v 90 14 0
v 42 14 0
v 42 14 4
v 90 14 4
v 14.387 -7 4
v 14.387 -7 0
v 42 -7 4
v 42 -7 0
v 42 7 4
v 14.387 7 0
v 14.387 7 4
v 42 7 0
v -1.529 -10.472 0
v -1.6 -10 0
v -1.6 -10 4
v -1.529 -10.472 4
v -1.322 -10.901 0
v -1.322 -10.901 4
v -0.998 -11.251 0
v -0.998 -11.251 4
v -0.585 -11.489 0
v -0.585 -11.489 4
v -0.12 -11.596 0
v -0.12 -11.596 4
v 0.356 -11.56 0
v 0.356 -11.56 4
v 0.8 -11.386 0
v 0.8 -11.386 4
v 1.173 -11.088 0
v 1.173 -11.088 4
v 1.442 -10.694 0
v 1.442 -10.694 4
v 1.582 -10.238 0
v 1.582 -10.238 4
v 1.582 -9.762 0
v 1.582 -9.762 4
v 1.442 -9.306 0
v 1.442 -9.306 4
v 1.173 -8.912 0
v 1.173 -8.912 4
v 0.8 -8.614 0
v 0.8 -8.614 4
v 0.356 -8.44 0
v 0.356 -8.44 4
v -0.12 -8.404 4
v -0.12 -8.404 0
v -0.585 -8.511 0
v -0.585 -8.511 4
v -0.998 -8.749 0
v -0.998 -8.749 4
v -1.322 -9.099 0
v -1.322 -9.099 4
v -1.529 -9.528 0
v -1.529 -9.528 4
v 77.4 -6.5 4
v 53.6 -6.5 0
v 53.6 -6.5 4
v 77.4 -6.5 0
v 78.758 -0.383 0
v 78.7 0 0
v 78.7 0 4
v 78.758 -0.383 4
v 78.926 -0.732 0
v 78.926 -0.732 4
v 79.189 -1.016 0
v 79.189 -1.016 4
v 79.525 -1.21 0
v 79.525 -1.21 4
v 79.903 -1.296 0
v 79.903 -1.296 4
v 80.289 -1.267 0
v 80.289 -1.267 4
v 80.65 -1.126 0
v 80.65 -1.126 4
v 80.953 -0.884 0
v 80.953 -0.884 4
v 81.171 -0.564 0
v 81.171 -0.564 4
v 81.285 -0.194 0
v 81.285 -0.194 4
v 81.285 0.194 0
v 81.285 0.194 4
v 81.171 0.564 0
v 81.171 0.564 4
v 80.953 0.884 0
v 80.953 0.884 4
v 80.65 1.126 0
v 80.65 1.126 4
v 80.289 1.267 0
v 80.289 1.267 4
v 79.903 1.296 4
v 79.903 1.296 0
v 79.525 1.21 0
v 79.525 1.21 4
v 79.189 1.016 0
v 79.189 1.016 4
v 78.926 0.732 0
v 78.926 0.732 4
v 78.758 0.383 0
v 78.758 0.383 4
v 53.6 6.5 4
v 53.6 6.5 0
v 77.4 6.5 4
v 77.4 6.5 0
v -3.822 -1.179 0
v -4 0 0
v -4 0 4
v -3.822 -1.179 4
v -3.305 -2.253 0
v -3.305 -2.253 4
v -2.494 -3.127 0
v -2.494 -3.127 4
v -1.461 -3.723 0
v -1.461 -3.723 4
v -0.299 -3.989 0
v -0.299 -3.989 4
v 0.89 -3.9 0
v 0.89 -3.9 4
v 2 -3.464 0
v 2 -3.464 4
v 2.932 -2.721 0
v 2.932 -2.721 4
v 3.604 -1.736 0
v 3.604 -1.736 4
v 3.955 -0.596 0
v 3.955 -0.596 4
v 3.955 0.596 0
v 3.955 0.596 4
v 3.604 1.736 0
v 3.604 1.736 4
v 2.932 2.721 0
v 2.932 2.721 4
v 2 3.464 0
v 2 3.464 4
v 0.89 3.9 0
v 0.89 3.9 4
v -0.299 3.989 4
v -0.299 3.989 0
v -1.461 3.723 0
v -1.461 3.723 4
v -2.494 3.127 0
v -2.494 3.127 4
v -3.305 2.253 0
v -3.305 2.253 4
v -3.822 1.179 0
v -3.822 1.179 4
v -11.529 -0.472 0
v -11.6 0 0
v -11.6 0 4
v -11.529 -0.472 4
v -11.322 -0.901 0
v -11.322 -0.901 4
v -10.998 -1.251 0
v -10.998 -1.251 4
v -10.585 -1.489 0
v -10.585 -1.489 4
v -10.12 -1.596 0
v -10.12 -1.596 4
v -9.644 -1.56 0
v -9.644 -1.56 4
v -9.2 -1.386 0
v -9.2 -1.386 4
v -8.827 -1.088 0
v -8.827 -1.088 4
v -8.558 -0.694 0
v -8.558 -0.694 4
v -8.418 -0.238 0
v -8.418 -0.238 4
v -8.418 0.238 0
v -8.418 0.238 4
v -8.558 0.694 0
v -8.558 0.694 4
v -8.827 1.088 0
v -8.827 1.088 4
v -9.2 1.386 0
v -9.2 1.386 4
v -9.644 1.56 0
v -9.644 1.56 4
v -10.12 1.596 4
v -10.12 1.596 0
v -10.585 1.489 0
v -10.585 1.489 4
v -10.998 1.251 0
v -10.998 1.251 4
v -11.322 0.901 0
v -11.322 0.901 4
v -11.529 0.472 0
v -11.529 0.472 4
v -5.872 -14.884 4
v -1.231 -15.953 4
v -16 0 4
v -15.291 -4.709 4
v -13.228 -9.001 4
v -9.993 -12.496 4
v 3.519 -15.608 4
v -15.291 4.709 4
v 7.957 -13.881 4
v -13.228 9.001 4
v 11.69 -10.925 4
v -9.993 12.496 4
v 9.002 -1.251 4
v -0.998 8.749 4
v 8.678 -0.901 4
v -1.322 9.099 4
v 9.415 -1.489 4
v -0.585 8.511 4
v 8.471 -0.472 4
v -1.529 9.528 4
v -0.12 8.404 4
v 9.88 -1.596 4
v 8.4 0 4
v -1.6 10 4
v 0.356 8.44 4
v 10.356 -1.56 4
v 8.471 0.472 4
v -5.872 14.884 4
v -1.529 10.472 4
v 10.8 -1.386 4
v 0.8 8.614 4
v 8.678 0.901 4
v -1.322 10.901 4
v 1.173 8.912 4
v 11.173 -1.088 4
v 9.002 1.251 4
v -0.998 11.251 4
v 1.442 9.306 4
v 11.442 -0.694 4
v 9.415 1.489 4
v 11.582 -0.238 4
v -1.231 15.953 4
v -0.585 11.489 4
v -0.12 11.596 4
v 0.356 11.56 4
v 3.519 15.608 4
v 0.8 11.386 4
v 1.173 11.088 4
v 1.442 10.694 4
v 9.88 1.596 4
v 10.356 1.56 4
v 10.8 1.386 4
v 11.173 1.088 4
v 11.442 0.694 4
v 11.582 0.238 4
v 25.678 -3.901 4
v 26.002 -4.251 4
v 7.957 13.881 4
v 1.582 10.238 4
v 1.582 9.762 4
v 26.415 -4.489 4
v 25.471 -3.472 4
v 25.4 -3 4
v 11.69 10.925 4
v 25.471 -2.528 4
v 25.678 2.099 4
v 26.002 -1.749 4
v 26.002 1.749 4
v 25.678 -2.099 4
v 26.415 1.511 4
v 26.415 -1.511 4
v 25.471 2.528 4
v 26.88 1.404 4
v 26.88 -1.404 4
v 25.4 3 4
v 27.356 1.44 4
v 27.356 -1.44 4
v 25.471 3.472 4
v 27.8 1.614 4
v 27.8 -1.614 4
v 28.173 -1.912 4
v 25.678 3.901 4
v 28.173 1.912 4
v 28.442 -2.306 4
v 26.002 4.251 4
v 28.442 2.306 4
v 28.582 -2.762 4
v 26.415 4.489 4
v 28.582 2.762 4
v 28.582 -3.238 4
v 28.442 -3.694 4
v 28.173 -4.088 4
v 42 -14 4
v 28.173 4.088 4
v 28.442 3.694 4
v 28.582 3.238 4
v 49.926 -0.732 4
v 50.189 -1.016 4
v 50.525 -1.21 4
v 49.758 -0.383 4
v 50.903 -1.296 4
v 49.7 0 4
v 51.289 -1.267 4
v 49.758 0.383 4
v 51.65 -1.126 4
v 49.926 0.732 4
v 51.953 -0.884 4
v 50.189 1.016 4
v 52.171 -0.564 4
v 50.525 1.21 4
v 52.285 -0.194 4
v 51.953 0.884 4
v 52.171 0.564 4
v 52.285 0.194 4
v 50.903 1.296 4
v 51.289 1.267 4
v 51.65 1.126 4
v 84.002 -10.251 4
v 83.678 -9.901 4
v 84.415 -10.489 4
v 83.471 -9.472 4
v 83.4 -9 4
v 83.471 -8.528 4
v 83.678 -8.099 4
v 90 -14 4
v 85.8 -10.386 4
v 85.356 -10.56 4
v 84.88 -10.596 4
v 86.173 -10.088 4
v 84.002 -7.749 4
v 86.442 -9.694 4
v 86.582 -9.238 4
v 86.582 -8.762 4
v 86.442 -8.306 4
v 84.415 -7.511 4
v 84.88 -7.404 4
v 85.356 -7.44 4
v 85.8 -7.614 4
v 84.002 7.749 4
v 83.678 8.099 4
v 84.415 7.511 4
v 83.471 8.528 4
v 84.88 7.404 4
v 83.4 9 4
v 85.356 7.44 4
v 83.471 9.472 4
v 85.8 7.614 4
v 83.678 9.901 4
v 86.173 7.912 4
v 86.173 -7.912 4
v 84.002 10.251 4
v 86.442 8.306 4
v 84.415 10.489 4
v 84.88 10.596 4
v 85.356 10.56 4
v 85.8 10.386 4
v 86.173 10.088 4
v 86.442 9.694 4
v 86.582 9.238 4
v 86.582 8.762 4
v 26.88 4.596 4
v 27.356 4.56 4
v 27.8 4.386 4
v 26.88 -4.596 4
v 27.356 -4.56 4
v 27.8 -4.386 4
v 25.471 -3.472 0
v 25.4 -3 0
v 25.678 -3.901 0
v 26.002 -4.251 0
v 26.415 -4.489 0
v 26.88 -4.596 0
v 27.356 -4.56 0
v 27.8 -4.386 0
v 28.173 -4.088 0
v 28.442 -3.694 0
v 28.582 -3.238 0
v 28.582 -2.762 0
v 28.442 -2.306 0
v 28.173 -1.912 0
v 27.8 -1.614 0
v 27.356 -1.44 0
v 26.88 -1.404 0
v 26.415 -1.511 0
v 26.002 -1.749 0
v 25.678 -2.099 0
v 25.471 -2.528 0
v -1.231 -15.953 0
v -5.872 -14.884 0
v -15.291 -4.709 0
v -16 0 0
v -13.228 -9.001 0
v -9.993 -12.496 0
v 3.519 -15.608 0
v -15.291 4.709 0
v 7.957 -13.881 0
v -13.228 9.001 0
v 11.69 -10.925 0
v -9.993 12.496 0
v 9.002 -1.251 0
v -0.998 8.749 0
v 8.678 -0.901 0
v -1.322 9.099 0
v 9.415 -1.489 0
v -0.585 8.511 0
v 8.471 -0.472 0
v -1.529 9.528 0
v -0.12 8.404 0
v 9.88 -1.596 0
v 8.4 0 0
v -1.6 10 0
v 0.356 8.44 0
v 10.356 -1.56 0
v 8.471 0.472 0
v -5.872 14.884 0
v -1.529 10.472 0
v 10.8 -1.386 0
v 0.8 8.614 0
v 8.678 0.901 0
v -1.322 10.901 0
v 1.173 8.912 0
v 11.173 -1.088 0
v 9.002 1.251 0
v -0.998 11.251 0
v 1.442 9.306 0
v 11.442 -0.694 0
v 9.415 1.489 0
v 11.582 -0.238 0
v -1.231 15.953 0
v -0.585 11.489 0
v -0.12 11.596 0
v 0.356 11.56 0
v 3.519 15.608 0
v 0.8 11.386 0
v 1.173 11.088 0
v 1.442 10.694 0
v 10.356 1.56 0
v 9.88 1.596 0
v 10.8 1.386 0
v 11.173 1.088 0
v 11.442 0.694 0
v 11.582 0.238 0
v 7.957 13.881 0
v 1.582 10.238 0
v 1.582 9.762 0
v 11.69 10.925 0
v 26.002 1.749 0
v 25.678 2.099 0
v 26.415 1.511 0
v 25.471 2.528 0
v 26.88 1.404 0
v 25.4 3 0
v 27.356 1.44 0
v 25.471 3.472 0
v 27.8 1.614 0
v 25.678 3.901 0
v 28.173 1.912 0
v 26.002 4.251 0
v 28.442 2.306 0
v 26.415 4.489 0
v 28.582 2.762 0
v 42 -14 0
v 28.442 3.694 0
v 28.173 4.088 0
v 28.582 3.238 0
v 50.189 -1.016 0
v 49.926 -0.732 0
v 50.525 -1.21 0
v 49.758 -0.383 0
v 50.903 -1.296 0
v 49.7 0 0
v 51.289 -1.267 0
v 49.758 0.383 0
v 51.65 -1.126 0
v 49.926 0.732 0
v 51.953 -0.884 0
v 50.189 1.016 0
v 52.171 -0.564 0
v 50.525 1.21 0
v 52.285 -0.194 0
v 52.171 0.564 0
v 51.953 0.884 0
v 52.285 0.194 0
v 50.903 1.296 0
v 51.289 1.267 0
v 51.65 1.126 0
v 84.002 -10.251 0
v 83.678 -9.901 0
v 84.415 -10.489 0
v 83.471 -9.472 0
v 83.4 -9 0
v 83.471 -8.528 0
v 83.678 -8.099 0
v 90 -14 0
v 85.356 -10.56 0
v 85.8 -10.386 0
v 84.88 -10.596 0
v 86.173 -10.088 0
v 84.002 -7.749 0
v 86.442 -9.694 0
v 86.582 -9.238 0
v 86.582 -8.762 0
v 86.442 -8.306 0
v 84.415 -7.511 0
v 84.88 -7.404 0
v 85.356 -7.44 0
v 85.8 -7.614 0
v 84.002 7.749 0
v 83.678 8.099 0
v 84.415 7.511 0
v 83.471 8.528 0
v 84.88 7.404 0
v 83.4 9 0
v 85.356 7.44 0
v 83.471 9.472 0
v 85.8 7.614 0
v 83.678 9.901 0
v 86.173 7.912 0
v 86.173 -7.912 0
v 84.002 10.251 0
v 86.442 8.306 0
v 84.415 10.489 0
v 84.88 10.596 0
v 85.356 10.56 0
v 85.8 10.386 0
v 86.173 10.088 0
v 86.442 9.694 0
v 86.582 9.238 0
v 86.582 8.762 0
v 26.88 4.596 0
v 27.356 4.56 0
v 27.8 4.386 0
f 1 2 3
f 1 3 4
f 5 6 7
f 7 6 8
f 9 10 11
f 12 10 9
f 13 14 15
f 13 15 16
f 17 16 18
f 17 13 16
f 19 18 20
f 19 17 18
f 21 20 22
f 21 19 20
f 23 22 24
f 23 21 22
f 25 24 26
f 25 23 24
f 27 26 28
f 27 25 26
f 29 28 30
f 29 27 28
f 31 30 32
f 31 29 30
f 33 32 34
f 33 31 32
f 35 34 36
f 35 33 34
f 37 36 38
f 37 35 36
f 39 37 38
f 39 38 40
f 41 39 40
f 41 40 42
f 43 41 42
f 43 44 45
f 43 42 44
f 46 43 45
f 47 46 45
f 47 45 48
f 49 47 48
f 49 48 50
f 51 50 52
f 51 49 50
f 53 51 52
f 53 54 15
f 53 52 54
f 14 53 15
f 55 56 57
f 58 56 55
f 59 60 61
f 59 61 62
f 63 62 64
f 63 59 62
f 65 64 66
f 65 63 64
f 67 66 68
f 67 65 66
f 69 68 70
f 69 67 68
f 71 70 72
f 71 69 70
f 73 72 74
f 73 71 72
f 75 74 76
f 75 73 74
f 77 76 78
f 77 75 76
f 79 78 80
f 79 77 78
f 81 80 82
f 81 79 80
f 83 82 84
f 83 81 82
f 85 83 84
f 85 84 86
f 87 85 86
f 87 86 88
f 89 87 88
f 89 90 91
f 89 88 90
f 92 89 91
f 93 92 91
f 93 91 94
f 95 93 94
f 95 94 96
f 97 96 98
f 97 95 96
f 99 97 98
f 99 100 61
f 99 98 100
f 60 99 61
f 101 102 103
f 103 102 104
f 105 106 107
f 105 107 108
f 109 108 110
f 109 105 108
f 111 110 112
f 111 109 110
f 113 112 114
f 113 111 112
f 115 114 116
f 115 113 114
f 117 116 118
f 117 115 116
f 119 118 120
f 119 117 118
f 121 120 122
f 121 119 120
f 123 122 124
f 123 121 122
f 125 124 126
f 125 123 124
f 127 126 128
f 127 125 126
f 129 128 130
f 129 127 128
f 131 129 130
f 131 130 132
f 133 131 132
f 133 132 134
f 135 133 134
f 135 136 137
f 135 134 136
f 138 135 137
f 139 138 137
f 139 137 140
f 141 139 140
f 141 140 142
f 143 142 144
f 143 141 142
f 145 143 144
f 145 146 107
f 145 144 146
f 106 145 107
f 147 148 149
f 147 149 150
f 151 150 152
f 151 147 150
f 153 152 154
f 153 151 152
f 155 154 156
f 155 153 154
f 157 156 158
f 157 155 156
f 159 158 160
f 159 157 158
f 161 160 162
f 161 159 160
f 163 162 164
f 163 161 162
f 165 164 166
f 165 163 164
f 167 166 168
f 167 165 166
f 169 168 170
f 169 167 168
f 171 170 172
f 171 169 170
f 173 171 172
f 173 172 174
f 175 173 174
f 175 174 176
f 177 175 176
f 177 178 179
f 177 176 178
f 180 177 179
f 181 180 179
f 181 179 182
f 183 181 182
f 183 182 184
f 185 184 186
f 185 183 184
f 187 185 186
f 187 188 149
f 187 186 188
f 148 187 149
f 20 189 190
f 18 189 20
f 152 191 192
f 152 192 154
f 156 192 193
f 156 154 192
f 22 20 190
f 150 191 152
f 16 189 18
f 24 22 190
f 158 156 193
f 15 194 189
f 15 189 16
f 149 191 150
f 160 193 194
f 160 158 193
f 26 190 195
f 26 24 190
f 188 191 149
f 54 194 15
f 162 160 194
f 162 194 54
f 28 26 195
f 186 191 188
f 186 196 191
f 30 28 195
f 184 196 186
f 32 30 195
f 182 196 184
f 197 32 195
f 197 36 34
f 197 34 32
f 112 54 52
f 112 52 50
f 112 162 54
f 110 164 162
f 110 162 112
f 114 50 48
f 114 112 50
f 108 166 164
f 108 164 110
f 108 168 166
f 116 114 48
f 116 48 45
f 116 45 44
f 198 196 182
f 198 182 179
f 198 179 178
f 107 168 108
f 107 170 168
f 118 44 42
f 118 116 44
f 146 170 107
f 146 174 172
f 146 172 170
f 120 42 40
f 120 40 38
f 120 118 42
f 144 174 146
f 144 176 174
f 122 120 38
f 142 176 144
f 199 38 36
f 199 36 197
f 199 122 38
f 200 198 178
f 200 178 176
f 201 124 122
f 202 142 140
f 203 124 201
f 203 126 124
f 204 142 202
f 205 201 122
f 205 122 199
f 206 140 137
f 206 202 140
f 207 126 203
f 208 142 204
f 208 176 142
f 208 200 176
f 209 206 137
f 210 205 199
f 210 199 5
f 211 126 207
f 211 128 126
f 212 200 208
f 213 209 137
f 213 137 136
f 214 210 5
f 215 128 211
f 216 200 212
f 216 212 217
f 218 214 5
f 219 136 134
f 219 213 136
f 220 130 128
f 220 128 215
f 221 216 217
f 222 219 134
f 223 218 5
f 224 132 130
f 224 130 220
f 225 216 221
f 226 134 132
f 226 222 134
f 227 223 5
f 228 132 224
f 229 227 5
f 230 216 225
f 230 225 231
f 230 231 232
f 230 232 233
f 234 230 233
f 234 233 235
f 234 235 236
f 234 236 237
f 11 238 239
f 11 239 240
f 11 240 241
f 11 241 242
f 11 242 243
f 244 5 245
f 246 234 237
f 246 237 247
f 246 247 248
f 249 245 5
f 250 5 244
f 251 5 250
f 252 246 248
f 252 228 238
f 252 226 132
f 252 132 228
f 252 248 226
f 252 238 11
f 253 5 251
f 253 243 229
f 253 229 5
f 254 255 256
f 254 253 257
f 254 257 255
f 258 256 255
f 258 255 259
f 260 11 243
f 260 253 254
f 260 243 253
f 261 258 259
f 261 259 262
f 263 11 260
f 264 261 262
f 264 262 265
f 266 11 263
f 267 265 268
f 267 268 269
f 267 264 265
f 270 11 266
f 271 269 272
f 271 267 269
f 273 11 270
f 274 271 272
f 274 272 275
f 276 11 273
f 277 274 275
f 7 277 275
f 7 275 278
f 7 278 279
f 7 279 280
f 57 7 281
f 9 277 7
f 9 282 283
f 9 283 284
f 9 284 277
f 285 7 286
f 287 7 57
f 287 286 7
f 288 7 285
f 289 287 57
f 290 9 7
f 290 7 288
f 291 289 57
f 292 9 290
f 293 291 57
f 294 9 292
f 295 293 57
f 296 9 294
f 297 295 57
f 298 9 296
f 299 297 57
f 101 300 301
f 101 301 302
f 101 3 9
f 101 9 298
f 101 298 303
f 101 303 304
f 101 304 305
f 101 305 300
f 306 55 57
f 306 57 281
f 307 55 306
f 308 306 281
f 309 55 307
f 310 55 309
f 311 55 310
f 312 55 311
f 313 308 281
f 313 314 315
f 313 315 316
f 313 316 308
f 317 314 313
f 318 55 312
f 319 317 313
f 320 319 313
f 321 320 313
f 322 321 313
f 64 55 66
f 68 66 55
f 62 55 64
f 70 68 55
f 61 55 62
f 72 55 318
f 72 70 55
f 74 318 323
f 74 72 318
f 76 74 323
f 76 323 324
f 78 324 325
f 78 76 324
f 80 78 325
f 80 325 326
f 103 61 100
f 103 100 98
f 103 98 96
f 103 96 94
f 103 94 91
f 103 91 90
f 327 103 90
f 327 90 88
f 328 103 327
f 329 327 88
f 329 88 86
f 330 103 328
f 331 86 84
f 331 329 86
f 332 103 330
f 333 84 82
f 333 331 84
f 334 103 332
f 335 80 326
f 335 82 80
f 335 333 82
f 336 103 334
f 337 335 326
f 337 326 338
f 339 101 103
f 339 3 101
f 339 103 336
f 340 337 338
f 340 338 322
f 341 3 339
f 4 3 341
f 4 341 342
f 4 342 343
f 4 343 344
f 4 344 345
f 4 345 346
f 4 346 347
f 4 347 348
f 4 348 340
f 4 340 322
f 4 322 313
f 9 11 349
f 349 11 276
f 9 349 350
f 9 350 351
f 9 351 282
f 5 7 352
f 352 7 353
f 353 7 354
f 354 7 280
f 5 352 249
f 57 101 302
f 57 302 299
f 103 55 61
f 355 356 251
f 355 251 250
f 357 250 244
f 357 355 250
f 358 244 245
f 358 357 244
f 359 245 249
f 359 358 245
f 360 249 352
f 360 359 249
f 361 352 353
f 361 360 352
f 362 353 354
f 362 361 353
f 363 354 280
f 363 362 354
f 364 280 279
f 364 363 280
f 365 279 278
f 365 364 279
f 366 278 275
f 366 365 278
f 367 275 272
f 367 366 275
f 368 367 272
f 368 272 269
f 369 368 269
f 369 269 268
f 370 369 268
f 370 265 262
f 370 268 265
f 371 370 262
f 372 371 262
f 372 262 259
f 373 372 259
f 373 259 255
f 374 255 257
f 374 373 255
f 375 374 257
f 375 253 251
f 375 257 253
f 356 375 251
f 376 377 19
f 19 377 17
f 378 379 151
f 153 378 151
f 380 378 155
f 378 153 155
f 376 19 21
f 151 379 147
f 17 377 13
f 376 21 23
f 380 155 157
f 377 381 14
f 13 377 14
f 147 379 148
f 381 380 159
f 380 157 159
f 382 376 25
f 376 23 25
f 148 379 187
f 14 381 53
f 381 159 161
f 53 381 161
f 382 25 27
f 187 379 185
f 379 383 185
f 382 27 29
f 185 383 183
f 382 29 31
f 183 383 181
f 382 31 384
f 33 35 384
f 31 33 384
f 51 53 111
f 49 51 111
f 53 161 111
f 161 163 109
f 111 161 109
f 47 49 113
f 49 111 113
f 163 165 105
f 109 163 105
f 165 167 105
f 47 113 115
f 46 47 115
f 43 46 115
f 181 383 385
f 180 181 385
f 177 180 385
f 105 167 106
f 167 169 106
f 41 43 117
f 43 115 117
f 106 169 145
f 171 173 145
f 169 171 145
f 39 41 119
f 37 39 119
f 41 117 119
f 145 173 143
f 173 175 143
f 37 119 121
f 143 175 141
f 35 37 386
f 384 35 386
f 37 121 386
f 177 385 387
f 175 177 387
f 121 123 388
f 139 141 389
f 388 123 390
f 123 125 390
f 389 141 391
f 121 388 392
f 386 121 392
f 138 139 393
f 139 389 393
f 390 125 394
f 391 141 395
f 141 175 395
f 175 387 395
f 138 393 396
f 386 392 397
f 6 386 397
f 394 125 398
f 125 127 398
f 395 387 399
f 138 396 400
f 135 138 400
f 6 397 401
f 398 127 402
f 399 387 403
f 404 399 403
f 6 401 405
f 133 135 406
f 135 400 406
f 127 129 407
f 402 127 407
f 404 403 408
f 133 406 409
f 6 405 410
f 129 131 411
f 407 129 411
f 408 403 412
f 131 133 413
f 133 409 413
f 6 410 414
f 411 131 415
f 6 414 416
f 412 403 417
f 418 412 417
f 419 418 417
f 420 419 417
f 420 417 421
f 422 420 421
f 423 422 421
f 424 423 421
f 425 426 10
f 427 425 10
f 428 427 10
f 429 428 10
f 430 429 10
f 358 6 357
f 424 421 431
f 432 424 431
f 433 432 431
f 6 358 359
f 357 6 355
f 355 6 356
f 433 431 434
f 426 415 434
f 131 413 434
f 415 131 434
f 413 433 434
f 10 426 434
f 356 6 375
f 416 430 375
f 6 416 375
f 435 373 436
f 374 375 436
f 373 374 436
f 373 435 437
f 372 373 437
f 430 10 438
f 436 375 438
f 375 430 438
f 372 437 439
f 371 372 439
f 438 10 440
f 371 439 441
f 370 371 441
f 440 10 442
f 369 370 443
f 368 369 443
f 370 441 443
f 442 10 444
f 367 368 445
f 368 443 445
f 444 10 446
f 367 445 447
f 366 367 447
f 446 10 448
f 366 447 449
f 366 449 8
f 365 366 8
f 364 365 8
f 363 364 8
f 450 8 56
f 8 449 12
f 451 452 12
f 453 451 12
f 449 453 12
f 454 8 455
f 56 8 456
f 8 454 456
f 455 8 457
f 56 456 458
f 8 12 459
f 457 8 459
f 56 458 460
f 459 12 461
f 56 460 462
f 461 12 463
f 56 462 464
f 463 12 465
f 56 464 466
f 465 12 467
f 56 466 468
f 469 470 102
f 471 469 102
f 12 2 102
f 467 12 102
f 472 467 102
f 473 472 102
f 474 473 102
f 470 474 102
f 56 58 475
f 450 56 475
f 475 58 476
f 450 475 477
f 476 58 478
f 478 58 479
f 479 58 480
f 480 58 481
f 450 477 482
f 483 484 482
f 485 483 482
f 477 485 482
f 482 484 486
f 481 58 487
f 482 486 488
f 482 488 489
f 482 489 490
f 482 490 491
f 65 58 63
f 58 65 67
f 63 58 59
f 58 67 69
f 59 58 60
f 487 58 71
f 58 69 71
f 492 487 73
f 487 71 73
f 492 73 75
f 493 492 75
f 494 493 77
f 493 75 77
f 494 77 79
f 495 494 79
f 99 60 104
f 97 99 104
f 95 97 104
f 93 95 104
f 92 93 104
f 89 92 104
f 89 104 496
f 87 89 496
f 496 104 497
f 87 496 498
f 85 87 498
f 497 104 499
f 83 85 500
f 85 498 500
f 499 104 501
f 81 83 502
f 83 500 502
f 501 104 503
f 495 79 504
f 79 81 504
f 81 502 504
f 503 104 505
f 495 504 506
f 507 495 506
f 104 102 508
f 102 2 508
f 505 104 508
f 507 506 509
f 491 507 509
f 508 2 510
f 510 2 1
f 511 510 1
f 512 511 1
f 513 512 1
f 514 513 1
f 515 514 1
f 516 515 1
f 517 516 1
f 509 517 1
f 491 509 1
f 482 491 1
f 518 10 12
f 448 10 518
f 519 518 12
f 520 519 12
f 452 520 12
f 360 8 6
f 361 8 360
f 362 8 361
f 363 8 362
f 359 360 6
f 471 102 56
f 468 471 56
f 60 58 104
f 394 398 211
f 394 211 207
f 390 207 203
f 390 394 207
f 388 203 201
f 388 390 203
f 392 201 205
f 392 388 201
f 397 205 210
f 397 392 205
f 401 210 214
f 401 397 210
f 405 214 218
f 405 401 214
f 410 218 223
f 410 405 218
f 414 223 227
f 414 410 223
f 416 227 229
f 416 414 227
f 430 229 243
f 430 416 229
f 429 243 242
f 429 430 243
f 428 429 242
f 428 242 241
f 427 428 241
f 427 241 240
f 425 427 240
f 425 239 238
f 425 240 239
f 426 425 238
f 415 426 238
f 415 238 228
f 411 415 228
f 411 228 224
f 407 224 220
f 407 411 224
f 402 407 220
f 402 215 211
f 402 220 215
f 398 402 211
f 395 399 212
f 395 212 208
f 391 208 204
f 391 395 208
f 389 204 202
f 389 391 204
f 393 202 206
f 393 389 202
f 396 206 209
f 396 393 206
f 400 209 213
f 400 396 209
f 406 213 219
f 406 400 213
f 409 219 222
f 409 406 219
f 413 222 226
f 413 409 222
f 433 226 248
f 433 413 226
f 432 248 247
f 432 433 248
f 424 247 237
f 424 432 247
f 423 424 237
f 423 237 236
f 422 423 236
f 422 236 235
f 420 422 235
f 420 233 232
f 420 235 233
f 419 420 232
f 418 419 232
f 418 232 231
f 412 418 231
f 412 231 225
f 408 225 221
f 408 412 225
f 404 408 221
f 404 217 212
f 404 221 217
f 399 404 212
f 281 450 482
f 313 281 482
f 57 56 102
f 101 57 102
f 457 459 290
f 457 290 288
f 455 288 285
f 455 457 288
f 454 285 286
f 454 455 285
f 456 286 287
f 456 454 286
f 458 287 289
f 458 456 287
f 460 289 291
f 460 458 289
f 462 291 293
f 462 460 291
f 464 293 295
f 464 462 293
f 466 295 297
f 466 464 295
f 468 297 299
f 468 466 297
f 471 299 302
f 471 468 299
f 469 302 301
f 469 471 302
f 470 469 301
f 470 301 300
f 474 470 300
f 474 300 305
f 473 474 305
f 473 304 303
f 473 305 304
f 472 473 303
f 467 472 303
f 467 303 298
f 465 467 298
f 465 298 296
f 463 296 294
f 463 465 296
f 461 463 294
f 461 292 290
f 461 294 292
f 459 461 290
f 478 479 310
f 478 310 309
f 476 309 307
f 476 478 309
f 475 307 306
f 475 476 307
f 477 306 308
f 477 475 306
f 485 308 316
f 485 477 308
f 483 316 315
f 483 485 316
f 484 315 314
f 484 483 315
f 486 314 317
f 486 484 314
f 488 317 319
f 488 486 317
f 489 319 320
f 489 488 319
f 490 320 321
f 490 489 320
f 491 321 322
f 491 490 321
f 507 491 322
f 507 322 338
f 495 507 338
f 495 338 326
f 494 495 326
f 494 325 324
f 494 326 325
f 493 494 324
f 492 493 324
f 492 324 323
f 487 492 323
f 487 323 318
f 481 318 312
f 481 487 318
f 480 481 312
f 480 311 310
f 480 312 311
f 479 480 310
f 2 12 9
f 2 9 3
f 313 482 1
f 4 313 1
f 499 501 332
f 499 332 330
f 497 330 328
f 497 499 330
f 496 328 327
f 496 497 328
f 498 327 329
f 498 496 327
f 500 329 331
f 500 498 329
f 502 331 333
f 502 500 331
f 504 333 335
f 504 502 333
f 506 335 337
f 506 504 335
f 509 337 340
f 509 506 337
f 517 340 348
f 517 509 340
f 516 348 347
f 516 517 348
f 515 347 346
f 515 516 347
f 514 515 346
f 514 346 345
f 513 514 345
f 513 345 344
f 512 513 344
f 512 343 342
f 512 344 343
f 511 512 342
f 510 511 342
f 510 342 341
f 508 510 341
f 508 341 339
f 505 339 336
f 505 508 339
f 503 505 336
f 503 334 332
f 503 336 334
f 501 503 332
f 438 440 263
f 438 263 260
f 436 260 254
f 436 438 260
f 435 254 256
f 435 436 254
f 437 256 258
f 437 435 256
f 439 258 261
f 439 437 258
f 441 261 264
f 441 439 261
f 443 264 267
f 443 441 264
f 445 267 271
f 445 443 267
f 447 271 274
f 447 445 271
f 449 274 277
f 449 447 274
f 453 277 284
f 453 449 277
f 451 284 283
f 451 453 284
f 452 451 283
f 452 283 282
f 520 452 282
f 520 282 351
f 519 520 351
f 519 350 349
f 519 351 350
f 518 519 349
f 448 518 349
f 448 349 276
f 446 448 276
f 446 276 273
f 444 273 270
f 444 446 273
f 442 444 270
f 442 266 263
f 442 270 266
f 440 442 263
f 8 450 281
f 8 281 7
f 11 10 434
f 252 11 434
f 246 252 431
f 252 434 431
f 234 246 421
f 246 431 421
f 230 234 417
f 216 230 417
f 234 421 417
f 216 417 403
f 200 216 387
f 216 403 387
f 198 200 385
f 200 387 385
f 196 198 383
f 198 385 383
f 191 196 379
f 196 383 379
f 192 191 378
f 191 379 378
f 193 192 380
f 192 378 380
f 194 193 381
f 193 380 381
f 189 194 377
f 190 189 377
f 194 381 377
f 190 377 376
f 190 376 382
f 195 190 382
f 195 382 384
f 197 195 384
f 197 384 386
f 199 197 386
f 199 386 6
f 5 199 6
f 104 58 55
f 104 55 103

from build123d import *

# Parameters (mm, degrees)
MAIN_WEB_PROFILE_W                     = 60
MAIN_WEB_PROFILE_H                     = 14
MAIN_WEB_DEPTH                         = 4
SHOULDER_HORN_FLANGE_PROFILE_R         = 16
SHOULDER_HORN_FLANGE_DEPTH             = 4
ELBOW_SERVO_MOUNT_PROFILE_W            = 48
ELBOW_SERVO_MOUNT_PROFILE_H            = 28
ELBOW_SERVO_MOUNT_DEPTH                = 4
SG90_BODY_CLEARANCE_START              = -5
SG90_BODY_CLEARANCE_PROFILE_W          = 23.8
SG90_BODY_CLEARANCE_PROFILE_H          = 13
SG90_BODY_CLEARANCE_DEPTH              = 97.49863387
ELBOW_TAB_FASTENERS_START              = -50
ELBOW_TAB_FASTENERS_PROFILE_R          = 1.3
ELBOW_TAB_FASTENERS_DEPTH              = 142.49863387
SHOULDER_CENTER_SCREW_ACCESS_START     = -50
SHOULDER_CENTER_SCREW_ACCESS_PROFILE_R = 4
SHOULDER_CENTER_SCREW_ACCESS_DEPTH     = 142.49863387
SHOULDER_HORN_BOLT_PATTERN_START       = -50
SHOULDER_HORN_BOLT_PATTERN_PROFILE_R   = 1.6
SHOULDER_HORN_BOLT_PATTERN_DEPTH       = 142.49863387
CABLE_TIE_HOLES_START                  = -50
CABLE_TIE_HOLES_PROFILE_R              = 1.6
CABLE_TIE_HOLES_DEPTH                  = 142.49863387
PASSIVE_CHEEK_STANDOFFS_START          = -50
PASSIVE_CHEEK_STANDOFFS_PROFILE_R      = 1.6
PASSIVE_CHEEK_STANDOFFS_DEPTH          = 142.49863387


with BuildPart() as part:
    # Main_web_profile → Main_web (new body)
    with BuildSketch(Plane.XY):
        with Locations((30, 0)):
            Rectangle(MAIN_WEB_PROFILE_W, MAIN_WEB_PROFILE_H)
    extrude(amount=MAIN_WEB_DEPTH)

    # Shoulder_horn_flange_profile → Shoulder_horn_flange (add)
    with BuildSketch(Plane.XY):
        Circle(SHOULDER_HORN_FLANGE_PROFILE_R)
    extrude(amount=SHOULDER_HORN_FLANGE_DEPTH)

    # Elbow_servo_mount_profile → Elbow_servo_mount (add)
    with BuildSketch(Plane.XY):
        with Locations((66, 0)):
            Rectangle(ELBOW_SERVO_MOUNT_PROFILE_W, ELBOW_SERVO_MOUNT_PROFILE_H)
    extrude(amount=ELBOW_SERVO_MOUNT_DEPTH)

    # SG90_body_clearance_profile → SG90_body_clearance (cut, through all)
    with BuildSketch(Plane.XY.offset(SG90_BODY_CLEARANCE_START)):
        with Locations((65.5, 0)):
            Rectangle(SG90_BODY_CLEARANCE_PROFILE_W, SG90_BODY_CLEARANCE_PROFILE_H)
    extrude(amount=SG90_BODY_CLEARANCE_DEPTH, mode=Mode.SUBTRACT)

    # Elbow_tab_fasteners_profile → Elbow_tab_fasteners (cut, through all)
    with BuildSketch(Plane.XY.offset(ELBOW_TAB_FASTENERS_START)):
        with Locations(Location((51, 0, 0), (0, 0, 180))):
            Circle(ELBOW_TAB_FASTENERS_PROFILE_R)
        with Locations(Location((80, 0, 0), (0, 0, 180))):
            Circle(ELBOW_TAB_FASTENERS_PROFILE_R)
    extrude(amount=ELBOW_TAB_FASTENERS_DEPTH, mode=Mode.SUBTRACT)

    # Shoulder_center_screw_access_profile → Shoulder_center_screw_access (cut, through all)
    with BuildSketch(Plane.XY.offset(SHOULDER_CENTER_SCREW_ACCESS_START)):
        with Locations(Location((0, 0, 0), (0, 0, 180))):
            Circle(SHOULDER_CENTER_SCREW_ACCESS_PROFILE_R)
    extrude(amount=SHOULDER_CENTER_SCREW_ACCESS_DEPTH, mode=Mode.SUBTRACT)

    # Shoulder_horn_bolt_pattern_profile → Shoulder_horn_bolt_pattern (cut, through all)
    with BuildSketch(Plane.XY.offset(SHOULDER_HORN_BOLT_PATTERN_START)):
        with Locations(Location((0, 10, 0), (0, 0, 180))):
            Circle(SHOULDER_HORN_BOLT_PATTERN_PROFILE_R)
        with Locations(Location((0, -10, 0), (0, 0, 180))):
            Circle(SHOULDER_HORN_BOLT_PATTERN_PROFILE_R)
        with Locations(Location((10, 0, 0), (0, 0, 180))):
            Circle(SHOULDER_HORN_BOLT_PATTERN_PROFILE_R)
        with Locations(Location((-10, 0, 0), (0, 0, 180))):
            Circle(SHOULDER_HORN_BOLT_PATTERN_PROFILE_R)
    extrude(amount=SHOULDER_HORN_BOLT_PATTERN_DEPTH, mode=Mode.SUBTRACT)

    # Cable_tie_holes_profile → Cable_tie_holes (cut, through all)
    with BuildSketch(Plane.XY.offset(CABLE_TIE_HOLES_START)):
        with Locations(Location((27, -3, 0), (0, 0, 180))):
            Circle(CABLE_TIE_HOLES_PROFILE_R)
        with Locations(Location((27, 3, 0), (0, 0, 180))):
            Circle(CABLE_TIE_HOLES_PROFILE_R)
    extrude(amount=CABLE_TIE_HOLES_DEPTH, mode=Mode.SUBTRACT)

    # Passive_cheek_standoffs_profile → Passive_cheek_standoffs (cut, through all)
    with BuildSketch(Plane.XY.offset(PASSIVE_CHEEK_STANDOFFS_START)):
        with Locations(Location((85, -9, 0), (0, 0, 180))):
            Circle(PASSIVE_CHEEK_STANDOFFS_PROFILE_R)
        with Locations(Location((85, 9, 0), (0, 0, 180))):
            Circle(PASSIVE_CHEEK_STANDOFFS_PROFILE_R)
    extrude(amount=PASSIVE_CHEEK_STANDOFFS_DEPTH, mode=Mode.SUBTRACT)


solid = part.part
